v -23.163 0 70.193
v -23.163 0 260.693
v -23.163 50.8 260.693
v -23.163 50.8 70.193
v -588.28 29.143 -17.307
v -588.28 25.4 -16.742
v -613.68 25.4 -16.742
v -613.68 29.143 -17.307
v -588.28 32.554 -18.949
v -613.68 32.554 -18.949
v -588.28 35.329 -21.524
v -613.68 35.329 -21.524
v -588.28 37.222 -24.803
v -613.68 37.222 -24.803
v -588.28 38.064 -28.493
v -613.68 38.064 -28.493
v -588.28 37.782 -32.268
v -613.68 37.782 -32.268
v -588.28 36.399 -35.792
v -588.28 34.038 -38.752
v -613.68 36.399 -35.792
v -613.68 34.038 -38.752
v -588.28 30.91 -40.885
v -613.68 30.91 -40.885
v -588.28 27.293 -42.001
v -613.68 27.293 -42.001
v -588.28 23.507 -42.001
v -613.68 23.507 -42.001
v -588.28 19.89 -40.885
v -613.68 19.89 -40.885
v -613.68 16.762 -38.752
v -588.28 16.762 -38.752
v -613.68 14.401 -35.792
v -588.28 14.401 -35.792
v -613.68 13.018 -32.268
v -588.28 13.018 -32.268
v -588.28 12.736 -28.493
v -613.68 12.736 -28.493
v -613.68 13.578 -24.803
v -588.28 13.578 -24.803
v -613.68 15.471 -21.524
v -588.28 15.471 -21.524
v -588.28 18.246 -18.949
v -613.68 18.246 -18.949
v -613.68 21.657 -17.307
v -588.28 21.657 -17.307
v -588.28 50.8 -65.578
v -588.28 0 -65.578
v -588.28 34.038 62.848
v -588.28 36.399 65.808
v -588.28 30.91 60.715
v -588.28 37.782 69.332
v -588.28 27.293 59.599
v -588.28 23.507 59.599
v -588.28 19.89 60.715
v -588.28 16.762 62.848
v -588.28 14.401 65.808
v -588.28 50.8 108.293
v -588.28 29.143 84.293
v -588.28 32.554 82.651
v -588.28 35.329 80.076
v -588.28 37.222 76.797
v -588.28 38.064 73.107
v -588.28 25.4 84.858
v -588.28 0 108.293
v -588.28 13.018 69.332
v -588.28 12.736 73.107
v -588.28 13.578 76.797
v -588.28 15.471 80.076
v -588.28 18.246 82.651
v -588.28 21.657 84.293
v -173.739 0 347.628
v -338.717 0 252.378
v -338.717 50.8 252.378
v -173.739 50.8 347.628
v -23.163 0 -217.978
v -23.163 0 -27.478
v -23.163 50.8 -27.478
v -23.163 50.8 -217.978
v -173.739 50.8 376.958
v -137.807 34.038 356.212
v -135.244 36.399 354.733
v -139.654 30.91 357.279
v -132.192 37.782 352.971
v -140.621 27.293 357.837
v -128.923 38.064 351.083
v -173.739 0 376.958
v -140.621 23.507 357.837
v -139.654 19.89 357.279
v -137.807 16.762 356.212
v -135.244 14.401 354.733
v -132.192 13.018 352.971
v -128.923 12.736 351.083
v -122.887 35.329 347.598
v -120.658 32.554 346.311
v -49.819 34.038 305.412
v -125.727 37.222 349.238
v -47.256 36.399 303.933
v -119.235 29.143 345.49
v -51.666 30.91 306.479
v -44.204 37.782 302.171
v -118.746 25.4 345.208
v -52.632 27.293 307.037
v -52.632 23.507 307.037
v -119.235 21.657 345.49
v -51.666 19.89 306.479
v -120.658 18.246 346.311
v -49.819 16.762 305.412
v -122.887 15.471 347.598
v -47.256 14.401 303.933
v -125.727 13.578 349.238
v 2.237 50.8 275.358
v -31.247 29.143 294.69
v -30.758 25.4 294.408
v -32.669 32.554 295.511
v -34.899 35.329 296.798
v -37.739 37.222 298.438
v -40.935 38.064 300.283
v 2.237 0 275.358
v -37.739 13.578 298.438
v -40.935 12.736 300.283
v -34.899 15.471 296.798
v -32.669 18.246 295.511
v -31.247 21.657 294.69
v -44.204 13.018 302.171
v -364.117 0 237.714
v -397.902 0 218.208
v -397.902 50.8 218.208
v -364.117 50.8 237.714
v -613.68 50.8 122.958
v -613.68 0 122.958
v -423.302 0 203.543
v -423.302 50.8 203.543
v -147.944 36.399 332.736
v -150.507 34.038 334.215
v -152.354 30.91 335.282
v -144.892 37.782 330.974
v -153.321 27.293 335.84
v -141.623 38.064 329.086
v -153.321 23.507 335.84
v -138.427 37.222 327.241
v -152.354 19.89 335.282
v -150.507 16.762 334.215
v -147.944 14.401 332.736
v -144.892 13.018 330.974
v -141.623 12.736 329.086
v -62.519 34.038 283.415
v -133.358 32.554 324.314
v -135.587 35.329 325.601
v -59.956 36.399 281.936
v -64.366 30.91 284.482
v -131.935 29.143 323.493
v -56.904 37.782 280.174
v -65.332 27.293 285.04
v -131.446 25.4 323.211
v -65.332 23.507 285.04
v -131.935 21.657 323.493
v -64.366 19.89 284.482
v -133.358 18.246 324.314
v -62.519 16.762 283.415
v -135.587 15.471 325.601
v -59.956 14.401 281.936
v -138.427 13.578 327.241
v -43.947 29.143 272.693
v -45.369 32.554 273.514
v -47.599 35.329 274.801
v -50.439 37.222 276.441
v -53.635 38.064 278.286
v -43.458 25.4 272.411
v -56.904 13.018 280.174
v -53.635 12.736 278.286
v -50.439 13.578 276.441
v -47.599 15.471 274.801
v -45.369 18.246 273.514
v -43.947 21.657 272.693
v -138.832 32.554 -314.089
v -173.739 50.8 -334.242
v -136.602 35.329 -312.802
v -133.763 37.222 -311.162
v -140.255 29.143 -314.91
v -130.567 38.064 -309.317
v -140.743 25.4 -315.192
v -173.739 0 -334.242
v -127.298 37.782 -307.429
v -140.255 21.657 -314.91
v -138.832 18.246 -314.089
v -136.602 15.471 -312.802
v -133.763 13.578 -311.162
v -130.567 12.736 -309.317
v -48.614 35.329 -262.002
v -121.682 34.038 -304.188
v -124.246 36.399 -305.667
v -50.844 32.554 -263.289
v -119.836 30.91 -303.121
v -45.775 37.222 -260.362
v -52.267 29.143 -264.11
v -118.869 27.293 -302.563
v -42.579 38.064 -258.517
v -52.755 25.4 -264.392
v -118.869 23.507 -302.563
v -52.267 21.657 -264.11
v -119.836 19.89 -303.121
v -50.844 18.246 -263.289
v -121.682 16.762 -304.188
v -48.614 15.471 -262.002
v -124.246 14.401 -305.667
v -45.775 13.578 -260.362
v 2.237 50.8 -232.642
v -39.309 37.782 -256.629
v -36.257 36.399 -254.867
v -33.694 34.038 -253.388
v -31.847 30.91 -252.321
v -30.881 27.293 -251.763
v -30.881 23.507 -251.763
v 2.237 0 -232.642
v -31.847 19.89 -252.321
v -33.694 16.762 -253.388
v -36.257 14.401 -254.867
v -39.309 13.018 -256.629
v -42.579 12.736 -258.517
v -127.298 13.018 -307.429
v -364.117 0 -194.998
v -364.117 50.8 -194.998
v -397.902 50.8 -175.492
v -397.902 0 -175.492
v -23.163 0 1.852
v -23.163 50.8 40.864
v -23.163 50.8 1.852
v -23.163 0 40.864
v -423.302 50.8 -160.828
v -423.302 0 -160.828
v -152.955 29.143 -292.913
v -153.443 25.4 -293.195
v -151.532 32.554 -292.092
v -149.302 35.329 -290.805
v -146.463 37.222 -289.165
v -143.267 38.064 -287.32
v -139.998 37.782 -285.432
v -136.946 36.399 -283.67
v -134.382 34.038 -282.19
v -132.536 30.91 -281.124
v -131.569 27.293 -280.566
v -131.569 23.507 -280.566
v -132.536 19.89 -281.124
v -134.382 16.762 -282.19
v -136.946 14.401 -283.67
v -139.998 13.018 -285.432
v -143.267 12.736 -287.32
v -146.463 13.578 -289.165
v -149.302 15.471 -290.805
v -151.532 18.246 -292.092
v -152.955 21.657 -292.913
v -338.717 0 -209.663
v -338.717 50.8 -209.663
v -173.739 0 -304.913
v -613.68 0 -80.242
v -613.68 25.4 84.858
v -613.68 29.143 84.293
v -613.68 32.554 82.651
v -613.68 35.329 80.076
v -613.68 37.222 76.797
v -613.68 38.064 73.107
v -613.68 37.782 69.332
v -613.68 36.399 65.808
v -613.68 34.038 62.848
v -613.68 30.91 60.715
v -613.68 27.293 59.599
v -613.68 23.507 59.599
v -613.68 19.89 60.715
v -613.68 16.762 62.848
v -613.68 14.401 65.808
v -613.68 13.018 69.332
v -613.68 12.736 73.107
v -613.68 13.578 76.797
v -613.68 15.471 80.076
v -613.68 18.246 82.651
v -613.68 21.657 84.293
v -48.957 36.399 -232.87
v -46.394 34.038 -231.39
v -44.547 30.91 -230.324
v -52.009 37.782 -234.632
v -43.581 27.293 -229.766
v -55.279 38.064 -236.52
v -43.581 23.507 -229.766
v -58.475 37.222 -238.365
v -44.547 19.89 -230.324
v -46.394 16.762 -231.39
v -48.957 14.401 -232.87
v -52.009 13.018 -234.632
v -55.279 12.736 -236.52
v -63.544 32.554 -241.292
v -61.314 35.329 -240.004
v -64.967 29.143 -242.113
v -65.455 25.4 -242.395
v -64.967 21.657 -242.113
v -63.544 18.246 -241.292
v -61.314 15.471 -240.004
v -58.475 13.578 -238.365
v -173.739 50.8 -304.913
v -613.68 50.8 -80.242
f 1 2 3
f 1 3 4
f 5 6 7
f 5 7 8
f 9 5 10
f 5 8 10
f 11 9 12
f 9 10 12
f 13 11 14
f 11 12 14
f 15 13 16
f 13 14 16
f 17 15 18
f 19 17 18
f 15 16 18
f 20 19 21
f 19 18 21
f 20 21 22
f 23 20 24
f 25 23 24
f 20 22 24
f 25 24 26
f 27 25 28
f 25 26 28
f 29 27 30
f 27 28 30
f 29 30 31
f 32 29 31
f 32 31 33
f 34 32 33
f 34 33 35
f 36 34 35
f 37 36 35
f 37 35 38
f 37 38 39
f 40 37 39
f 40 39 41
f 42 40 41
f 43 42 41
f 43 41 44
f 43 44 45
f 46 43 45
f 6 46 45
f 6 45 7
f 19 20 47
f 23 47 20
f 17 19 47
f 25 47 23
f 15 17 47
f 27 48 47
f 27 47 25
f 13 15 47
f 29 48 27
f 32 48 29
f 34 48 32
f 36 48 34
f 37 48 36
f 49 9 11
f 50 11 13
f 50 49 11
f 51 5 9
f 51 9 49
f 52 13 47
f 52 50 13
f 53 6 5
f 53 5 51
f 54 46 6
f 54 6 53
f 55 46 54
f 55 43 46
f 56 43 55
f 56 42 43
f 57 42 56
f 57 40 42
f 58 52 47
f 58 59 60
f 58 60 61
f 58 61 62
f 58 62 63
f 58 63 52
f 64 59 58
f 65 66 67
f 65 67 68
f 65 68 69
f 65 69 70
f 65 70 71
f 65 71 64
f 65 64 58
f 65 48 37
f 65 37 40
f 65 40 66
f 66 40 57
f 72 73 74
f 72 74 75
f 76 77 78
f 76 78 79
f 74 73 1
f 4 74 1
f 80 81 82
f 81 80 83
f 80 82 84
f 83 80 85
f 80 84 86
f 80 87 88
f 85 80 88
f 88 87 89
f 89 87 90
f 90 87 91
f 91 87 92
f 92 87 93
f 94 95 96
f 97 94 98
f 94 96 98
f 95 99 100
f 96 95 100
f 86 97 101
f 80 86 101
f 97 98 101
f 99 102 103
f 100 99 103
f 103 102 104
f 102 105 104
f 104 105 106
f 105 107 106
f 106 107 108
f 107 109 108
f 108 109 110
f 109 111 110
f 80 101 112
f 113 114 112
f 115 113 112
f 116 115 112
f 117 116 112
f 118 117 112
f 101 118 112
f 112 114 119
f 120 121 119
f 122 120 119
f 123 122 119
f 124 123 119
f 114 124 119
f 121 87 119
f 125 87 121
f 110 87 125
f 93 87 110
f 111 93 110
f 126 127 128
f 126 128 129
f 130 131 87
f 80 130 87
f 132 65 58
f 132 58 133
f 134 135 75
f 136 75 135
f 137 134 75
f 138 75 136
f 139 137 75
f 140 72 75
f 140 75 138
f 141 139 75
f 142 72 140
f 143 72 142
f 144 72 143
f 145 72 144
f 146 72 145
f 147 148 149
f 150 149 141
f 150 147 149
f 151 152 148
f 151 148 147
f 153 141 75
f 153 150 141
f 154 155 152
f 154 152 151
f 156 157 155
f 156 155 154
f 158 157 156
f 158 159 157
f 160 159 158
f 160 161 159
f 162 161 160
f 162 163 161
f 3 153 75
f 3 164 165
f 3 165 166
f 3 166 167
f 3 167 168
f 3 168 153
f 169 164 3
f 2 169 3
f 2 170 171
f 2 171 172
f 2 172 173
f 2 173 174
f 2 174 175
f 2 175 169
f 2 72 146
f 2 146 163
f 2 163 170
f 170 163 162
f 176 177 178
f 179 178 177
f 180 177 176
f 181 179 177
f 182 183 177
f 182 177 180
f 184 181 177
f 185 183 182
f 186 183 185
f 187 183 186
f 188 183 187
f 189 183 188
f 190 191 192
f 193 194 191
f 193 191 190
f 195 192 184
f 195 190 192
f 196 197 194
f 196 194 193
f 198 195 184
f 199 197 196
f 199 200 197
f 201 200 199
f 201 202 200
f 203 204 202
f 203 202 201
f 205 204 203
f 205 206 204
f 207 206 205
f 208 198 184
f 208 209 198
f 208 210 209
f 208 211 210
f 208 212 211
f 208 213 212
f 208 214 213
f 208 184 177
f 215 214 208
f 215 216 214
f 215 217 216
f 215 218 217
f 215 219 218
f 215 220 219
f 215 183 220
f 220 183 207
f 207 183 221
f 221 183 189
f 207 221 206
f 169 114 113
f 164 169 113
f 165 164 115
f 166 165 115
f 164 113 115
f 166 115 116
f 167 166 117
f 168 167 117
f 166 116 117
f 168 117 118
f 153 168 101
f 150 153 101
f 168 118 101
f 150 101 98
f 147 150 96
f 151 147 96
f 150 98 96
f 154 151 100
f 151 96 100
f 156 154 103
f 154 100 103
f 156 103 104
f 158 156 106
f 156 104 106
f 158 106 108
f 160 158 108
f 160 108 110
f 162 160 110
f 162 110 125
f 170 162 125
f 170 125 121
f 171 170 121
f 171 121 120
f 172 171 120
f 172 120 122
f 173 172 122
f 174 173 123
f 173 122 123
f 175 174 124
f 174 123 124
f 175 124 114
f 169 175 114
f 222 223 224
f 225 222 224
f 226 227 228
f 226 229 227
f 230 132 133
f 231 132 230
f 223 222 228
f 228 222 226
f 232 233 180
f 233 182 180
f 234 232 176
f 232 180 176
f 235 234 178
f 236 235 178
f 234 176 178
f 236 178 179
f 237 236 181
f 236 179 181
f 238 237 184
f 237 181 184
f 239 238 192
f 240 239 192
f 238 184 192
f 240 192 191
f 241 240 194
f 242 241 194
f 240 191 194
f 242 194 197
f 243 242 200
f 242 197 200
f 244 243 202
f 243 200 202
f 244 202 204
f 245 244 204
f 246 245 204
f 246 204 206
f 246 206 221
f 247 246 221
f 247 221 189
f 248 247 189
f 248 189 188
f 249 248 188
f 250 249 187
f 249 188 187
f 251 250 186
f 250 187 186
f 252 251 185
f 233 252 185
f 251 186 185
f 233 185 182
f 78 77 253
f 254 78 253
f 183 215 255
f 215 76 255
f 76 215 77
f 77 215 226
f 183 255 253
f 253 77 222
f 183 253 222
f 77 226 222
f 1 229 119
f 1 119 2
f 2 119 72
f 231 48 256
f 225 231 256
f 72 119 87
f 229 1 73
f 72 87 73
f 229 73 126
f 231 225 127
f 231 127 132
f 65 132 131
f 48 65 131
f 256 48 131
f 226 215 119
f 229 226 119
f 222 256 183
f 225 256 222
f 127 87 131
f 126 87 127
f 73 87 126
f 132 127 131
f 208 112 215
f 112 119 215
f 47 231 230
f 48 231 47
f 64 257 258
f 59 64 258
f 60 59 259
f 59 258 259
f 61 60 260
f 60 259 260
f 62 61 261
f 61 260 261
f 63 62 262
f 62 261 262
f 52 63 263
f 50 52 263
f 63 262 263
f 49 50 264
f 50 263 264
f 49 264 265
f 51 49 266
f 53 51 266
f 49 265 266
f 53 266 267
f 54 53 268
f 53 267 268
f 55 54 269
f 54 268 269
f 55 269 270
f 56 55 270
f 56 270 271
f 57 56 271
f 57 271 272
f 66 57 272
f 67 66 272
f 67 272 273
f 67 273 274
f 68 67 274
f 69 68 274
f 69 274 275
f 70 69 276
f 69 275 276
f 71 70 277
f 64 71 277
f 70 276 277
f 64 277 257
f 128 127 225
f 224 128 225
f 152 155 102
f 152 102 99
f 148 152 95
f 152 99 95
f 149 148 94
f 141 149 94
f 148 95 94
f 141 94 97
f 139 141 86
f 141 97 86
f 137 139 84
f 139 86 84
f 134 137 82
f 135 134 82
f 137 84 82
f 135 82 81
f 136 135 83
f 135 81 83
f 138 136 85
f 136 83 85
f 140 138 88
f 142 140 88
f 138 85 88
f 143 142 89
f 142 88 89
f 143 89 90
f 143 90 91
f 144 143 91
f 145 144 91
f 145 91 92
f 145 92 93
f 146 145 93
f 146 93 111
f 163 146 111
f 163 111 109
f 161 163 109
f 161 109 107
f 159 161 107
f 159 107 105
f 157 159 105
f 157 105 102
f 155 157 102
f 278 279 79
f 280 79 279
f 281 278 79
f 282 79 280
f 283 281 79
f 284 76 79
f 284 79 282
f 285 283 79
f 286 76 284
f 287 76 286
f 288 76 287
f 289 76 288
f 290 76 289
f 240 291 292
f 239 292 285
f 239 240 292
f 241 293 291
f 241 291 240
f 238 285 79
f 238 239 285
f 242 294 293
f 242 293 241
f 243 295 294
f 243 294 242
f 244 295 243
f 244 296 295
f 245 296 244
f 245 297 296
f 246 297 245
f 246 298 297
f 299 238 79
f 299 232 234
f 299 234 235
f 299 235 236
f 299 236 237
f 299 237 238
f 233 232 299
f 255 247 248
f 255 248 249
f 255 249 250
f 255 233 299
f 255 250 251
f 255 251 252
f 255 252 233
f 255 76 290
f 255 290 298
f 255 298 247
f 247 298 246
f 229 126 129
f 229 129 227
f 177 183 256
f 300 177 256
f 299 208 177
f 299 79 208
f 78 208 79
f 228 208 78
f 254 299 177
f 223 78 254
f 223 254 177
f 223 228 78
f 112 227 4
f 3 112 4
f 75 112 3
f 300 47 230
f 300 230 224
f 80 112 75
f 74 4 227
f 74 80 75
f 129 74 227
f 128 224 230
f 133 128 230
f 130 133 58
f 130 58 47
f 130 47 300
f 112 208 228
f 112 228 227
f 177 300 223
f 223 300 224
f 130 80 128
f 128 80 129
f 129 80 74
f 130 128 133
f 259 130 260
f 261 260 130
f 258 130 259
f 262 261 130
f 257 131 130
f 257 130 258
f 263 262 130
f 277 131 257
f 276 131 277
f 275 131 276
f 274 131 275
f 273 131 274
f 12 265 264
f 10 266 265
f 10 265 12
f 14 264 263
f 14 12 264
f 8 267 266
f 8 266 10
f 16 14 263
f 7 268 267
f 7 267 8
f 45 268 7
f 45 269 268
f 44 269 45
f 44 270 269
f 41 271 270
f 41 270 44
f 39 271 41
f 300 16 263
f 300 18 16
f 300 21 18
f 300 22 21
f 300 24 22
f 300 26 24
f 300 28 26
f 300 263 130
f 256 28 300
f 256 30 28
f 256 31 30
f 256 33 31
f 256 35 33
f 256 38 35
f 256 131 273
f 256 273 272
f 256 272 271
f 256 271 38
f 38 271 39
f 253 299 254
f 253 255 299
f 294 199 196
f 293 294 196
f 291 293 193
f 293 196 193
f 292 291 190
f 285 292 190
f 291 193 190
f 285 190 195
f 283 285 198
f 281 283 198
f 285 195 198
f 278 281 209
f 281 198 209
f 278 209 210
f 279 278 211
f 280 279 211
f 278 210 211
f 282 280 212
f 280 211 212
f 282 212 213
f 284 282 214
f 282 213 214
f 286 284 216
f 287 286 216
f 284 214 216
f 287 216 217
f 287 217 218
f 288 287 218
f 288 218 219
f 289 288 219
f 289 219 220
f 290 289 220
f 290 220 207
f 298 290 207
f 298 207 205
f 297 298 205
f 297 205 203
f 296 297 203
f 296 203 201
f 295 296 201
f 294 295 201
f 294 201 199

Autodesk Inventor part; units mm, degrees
ref_plane "YZ Plane" through (0, 0, 0) normal (1, 0, 0) x (0, 1, 0)
ref_plane "XZ Plane" through (0, 0, 0) normal (0, 1, 0) x (-1, 0, 0)
ref_plane "XY Plane" through (0, 0, 0) normal (0, 0, 1) x (1, 0, 0)
sketch "Sketch1" plane through (0, 0, 0) normal (0, 1, 0) x (-1, 0, 0)
  line L0 (613.6799, 122.9576) -> (173.739, 376.9576)
  line L1 (-2.2373, 275.3576) -> (-2.2373, -232.6424)
  line L2 (173.739, -334.2424) -> (613.6799, -80.2424)
  line L3 (613.6799, 122.9576) -> (613.6799, -80.2424)
  line L4 (173.739, 376.9576) -> (-2.2373, 275.3576)
  line L5 (173.739, -334.2424) -> (-2.2373, -232.6424)
  line L6 (588.2799, 108.2929) -> (173.739, 347.6282)
  line L7 (173.739, 347.6282) -> (23.1627, 260.6929)
  line L8 (23.1627, 260.6929) -> (23.1627, -217.9777)
  line L9 (23.1627, -217.9777) -> (173.739, -304.913)
  line L10 (173.739, -304.913) -> (588.2799, -65.5777)
  line L11 (588.2799, -65.5777) -> (588.2799, 108.2929)
  line L12 (397.9021, 218.2076) -> (397.9021, -175.4924)
  line L13 (364.1169, 237.7135) -> (23.1627, 40.8635)
  line L14 (364.1169, -194.9983) -> (23.1627, 1.8517)
  line L15 (338.7169, 252.3782) -> (23.1627, 70.1929)
  line L16 (23.1627, -27.4777) -> (338.7169, -209.663)
  line L17 (423.3021, 203.5429) -> (423.3021, -160.8277)
  point P0 (0, 0)
  dimension "d0" = 203.2
  dimension "d6" = 508
  dimension "d14" = 393.7
  dimension "d16" = 393.7
  dimension "d17" = 393.7
extrude "Extrusion1" add sketch "Sketch1" along normal blind 50.8 contours L3 L2 L5 L1 L4 L0 | L17 L10 L12 L6 | L13 L8 L15 L6 | L10 L16 L8 L14
sketch "Sketch2" plane through (2.2373, 0, 275.3576) normal (0.5, 0, 0.866) x (0.866, 0, -0.5)
  line L0 (-203.2, 0) -> (0, 0) projected
  line L1 (0, 0) -> (0, 50.8) projected
  line L2 (-203.2, 50.8) -> (0, 50.8) projected
  line L3 (-203.2, 0) -> (-203.2, 50.8) projected
  line L4 (-203.2, 50.8) -> (0, 50.8) projected
  line L5 (-101.6, 50.8) -> (-101.6, 0)
  line L6 (-101.6, 25.4) -> (-152.4, 25.4)
  line L7 (-101.6, 25.4) -> (-50.8, 25.4)
  circle A0 centre (-50.8, 25.4) radius 12.7
  circle A1 centre (-152.4, 25.4) radius 12.7
  point P0 (135.7412, 0)
  dimension "d23" = 50.8
  dimension "d24" = 50.8
  dimension "d25" = 25.4
  dimension "d26" = 25.4
extrude "Extrusion2" cut sketch "Sketch2" against normal blind 25.4 contours A1 | A0
sketch "Sketch3" plane through (-173.739, 0, -334.2424) normal (0.5, 0, -0.866) x (-0.866, 0, -0.5)
  line L0 (-203.2, 0) -> (0, 0) projected
  line L1 (0, 0) -> (0, 50.8) projected
  line L2 (-203.2, 50.8) -> (0, 50.8) projected
  line L3 (-203.2, 0) -> (-203.2, 50.8) projected
  line L4 (152.4, 50.8) -> (-355.6, 50.8) projected
  line L5 (-101.6, 50.8) -> (-101.6, 0)
  line L6 (152.4, 0) -> (-355.6, 0) projected
  line L7 (-101.6, 25.4) -> (-152.4, 25.4)
  line L8 (-101.6, 25.4) -> (-50.8, 25.4)
  circle A0 centre (-50.8, 25.4) radius 12.7
  circle A1 centre (-152.4, 25.4) radius 12.7
  point P0 (-317.5836, 0)
  dimension "d29" = 50.8
  dimension "d30" = 50.8
  dimension "d31" = 25.4
  dimension "d32" = 25.4
extrude "Extrusion3" cut sketch "Sketch3" against normal blind 25.4 contours A1 | A0
sketch "Sketch4" plane through (-613.6799, 0, -80.2424) normal (-1, 0, 0) x (0, 0, 1)
  line L0 (150.4353, 0) -> (150.4353, 50.8) projected
  line L1 (0, 0) -> (203.2, 0) projected
  line L2 (203.2, 0) -> (203.2, 50.8) projected
  line L3 (0, 50.8) -> (203.2, 50.8) projected
  line L4 (0, 0) -> (0, 50.8) projected
  line L5 (355.6, 50.8) -> (-152.4, 50.8) projected
  line L6 (101.6, 50.8) -> (101.6, 0)
  line L7 (355.6, 0) -> (-152.4, 0) projected
  line L8 (101.6, 25.4) -> (50.8, 25.4)
  line L9 (101.6, 25.4) -> (152.4, 25.4)
  circle A0 centre (152.4, 25.4) radius 12.7
  circle A1 centre (50.8, 25.4) radius 12.7
  point P0 (80.2424, 0)
  dimension "d35" = 50.8
  dimension "d36" = 50.8
  dimension "d37" = 25.4
  dimension "d38" = 25.4
extrude "Extrusion4" cut sketch "Sketch4" against normal blind 25.4 contours A0 L9 L0 | L0 A0 | A1 | L9 A0 L0
properties part number "Top" material "Steel"
